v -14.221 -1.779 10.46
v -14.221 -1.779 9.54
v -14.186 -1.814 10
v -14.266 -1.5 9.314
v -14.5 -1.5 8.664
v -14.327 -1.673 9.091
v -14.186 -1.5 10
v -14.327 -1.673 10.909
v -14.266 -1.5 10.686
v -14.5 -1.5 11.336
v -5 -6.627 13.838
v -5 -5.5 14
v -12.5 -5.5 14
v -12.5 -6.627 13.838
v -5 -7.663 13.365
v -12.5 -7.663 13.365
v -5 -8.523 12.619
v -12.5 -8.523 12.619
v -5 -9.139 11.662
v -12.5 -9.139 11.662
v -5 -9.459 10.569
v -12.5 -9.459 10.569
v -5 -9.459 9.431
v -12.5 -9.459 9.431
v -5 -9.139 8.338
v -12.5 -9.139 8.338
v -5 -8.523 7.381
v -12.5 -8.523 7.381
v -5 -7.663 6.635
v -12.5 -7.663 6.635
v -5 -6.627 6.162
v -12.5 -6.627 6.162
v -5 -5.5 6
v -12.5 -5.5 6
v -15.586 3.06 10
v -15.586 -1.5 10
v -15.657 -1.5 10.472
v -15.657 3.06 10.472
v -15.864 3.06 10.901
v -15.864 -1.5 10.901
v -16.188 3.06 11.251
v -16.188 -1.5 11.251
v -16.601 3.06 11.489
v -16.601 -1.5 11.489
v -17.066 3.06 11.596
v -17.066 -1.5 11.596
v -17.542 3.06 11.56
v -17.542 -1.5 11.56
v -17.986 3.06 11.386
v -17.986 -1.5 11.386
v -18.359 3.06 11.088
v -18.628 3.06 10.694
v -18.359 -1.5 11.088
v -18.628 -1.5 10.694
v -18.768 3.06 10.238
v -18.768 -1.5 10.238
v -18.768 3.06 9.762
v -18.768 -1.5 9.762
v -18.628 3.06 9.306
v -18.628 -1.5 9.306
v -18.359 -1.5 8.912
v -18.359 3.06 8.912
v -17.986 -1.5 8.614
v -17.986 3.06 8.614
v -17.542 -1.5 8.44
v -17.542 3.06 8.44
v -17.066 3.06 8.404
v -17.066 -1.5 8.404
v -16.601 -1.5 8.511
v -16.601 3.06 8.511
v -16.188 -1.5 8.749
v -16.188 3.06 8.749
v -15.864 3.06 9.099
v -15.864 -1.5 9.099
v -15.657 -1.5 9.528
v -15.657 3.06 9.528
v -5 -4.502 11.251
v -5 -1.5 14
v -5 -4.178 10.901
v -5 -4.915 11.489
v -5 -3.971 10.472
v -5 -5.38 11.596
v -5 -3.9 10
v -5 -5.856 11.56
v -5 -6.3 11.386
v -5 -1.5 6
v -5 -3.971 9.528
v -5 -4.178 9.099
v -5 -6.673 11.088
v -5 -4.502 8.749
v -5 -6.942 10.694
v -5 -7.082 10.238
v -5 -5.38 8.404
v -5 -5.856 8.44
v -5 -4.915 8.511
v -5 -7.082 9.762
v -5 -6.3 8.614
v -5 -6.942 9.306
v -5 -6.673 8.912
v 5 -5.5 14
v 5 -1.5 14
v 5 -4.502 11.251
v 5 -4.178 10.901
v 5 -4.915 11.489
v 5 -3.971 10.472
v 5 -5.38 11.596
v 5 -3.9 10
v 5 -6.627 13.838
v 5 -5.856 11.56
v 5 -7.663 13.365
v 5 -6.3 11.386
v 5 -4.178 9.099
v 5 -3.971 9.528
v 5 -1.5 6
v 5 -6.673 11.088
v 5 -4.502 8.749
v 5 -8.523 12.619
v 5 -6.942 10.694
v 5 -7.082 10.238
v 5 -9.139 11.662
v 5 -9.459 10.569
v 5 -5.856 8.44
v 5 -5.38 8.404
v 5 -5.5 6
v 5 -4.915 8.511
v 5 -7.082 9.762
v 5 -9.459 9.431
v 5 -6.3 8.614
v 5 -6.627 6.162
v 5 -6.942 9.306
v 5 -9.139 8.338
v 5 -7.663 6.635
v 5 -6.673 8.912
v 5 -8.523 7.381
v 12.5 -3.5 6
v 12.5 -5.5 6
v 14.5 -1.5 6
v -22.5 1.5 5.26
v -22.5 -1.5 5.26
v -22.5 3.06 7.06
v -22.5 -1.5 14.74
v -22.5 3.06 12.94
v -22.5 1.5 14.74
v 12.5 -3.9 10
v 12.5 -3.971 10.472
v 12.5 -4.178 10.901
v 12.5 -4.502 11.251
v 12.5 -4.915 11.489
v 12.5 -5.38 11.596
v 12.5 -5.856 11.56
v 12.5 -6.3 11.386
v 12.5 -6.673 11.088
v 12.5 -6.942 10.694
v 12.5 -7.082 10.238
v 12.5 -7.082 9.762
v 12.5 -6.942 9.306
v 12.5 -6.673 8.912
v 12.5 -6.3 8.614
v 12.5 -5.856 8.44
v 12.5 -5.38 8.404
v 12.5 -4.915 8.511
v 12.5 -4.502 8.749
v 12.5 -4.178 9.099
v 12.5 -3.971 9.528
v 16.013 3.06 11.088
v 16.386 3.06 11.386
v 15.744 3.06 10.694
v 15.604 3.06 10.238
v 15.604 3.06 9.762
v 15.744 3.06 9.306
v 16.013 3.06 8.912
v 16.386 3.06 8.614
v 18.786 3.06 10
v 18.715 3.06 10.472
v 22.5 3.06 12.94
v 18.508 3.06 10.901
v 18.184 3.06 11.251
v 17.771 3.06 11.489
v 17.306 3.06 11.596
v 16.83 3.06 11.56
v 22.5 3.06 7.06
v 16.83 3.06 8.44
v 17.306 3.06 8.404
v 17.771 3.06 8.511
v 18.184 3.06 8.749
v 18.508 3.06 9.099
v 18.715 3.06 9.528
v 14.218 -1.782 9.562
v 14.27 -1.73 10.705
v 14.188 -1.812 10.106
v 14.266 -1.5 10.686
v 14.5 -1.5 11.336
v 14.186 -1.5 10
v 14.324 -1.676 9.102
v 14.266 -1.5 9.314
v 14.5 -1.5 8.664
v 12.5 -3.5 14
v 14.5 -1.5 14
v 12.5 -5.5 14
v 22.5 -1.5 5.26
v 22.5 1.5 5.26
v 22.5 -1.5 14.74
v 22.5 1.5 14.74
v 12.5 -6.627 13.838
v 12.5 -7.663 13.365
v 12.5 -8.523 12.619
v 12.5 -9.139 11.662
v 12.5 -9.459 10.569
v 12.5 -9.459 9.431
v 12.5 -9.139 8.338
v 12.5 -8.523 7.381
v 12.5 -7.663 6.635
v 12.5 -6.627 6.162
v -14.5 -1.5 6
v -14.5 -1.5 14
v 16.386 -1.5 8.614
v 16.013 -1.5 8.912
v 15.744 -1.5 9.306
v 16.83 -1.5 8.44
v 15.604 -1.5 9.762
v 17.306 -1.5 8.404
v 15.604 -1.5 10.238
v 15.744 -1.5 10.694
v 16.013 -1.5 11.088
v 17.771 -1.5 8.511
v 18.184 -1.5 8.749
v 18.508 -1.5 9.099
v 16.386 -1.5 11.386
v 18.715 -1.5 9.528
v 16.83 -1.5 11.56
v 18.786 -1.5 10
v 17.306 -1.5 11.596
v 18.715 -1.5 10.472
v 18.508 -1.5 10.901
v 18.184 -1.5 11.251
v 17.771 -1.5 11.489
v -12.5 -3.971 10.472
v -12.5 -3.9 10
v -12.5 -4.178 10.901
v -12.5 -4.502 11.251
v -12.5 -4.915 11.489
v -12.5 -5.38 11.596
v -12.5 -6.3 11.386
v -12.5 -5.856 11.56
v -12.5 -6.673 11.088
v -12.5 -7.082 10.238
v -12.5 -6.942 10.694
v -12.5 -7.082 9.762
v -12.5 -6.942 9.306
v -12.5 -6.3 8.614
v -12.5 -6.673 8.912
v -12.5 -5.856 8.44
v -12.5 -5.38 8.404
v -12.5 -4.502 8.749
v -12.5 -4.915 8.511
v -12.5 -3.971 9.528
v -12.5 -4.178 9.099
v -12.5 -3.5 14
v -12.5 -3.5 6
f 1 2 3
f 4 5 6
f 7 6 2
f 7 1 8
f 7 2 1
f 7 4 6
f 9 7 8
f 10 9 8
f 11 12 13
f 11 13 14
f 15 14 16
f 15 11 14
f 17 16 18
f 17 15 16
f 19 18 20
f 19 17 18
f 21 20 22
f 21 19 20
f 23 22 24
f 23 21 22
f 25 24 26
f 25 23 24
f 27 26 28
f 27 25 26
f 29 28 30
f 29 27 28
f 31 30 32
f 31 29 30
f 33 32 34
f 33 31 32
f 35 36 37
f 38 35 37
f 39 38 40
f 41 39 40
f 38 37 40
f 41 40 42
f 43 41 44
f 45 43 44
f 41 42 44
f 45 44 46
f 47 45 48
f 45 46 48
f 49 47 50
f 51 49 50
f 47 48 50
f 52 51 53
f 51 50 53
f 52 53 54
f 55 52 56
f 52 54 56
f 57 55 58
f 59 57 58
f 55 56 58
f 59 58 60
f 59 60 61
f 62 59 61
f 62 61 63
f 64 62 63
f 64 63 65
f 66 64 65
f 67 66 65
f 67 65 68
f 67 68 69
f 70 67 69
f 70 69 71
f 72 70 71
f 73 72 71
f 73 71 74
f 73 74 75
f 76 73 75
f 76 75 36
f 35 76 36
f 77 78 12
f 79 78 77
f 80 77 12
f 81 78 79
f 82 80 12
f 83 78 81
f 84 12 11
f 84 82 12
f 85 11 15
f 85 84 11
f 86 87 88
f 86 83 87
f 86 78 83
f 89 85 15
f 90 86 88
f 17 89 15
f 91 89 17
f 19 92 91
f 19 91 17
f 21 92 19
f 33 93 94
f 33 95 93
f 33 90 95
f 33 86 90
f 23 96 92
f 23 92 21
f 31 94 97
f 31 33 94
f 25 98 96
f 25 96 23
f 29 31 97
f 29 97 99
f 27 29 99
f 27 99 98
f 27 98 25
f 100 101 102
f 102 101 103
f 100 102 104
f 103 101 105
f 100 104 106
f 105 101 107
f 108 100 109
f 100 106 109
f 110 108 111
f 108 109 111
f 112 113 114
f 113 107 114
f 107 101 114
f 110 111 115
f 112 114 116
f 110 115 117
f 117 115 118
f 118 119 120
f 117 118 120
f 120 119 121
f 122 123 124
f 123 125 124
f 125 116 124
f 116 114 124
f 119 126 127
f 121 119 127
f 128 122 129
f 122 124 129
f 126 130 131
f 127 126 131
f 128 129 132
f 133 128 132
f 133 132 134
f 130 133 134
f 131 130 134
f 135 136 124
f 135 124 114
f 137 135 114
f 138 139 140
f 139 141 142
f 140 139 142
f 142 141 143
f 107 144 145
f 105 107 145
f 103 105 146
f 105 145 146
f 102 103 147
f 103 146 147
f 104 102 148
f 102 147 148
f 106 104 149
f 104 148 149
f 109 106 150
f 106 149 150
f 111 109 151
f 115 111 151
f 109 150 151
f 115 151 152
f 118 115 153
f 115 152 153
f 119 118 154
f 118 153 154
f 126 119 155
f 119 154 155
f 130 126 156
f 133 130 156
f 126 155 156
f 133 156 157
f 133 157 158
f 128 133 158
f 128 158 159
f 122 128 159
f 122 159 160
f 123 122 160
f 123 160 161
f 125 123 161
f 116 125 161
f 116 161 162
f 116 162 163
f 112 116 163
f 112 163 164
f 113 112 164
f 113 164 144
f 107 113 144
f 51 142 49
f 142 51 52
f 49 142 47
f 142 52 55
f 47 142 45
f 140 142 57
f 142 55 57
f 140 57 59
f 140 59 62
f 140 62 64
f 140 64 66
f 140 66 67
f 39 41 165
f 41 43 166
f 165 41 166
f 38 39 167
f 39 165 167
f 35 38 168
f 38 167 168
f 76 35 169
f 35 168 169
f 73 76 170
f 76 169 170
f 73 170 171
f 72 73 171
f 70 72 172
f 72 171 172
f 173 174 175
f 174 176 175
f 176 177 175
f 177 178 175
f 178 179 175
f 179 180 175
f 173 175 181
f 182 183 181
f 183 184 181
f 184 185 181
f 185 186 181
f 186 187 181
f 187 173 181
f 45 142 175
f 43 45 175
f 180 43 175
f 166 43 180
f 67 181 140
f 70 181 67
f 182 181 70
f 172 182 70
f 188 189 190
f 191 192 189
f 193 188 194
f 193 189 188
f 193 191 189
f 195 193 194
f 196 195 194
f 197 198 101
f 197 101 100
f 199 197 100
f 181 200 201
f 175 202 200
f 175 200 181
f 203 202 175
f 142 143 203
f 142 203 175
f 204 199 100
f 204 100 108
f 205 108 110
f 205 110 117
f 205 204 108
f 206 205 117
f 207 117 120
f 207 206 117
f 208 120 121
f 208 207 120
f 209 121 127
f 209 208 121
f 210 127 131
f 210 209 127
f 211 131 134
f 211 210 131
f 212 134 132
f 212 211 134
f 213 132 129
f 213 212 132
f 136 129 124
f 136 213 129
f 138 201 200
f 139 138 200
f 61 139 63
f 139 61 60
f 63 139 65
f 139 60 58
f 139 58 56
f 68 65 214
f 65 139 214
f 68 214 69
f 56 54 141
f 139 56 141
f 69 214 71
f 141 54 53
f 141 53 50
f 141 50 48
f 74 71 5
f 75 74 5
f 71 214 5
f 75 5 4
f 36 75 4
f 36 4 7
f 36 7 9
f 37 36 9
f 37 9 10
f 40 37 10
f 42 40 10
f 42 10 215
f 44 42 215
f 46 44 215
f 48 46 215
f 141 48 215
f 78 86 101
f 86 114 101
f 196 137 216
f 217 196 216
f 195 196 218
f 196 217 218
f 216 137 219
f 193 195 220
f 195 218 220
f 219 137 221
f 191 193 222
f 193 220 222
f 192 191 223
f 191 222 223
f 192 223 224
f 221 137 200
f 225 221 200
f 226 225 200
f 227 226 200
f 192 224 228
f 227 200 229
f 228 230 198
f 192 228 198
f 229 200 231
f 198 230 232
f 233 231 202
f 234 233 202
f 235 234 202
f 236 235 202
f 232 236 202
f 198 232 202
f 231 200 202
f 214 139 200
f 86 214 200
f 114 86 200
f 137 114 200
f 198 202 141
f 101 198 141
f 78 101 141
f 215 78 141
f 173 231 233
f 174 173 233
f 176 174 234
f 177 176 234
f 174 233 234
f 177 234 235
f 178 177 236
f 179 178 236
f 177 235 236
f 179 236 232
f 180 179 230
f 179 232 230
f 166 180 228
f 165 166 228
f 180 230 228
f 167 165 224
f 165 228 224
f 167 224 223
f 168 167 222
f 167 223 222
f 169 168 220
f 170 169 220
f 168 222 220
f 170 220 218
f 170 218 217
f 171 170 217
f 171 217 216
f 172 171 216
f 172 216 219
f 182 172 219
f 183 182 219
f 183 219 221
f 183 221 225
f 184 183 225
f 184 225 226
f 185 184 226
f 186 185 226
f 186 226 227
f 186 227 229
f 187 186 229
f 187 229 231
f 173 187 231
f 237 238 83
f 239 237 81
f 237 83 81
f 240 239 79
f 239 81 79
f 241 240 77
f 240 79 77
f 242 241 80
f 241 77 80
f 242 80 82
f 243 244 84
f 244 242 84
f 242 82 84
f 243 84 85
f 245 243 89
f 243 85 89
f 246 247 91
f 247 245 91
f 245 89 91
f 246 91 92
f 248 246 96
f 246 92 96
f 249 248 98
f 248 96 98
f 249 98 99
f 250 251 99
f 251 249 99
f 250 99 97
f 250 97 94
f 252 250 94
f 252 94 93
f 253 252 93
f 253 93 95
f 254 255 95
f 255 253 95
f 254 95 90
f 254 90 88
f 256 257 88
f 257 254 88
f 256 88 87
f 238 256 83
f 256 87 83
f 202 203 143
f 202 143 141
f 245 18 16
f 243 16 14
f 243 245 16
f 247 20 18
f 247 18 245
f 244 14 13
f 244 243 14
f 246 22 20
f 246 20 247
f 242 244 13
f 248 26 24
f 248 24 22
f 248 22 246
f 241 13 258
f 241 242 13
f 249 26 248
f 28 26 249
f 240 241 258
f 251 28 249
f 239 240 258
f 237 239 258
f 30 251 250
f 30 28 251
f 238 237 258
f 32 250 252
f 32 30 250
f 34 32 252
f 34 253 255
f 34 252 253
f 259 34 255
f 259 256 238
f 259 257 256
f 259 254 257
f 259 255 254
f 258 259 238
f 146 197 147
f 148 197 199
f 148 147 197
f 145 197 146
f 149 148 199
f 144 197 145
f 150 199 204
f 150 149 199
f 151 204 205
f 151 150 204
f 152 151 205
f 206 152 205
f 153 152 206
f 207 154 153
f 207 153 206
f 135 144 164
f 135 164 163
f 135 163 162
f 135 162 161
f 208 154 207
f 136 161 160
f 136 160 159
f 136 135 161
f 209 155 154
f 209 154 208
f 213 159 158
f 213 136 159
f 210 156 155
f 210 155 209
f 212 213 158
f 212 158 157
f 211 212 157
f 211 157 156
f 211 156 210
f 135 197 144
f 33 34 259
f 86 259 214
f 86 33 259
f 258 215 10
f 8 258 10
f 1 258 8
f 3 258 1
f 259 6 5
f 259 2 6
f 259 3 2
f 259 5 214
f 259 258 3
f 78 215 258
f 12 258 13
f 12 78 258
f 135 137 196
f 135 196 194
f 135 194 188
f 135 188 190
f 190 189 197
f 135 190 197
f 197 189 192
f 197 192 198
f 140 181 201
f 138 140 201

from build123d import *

# Parameters (mm, degrees)
SKETCH_W           = 45
SKETCH_H           = 3
PAD_DEPTH          = 20
PAD001_DEPTH       = 45
SKETCH002_R        = 1.6
POCKET_DEPTH       = 4.561
SKETCH004_R        = 1.6
PAD002_DEPTH       = 45
PAD002_FACE9_R     = 1.6
POCKET001_DEPTH    = 10
POCKET001_FACE14_R = 1.6
POCKET002_DEPTH    = 10
SKETCH005_W        = 10
SKETCH005_H        = 8
POCKET003_DEPTH    = 20.001
SKETCH006_W        = 3
SKETCH006_H        = 5.26
POCKET004_DEPTH    = 45.001
CHAMFER_SIZE       = 2
SKETCH007_R        = 3
POCKET005_DEPTH    = 8.001


with BuildPart() as part:
    # Sketch → Pad (new body)
    with BuildSketch(Plane.XY):
        Rectangle(SKETCH_W, SKETCH_H)
    extrude(amount=PAD_DEPTH)

    # Sketch001 (on Face2 of Pad) → Pad001 (join)
    with BuildSketch(Plane.YZ.offset(22.5)):
        Polygon((1.5, 10), (1.5, 14.74), (3.06, 12.94), (3.06, 7.06), (1.5, 5.26), align=None)
    extrude(amount=-PAD001_DEPTH)

    # Sketch002 (on Face6 of Pad001) → Pocket (cut, through all)
    with BuildSketch(Plane.XZ.offset(1.5)):
        with Locations((-17.186, 10)):
            Circle(SKETCH002_R)
        with Locations((17.186, 10)):
            Circle(SKETCH002_R)
    extrude(amount=-POCKET_DEPTH, mode=Mode.SUBTRACT)

    # Sketch004 (on Face3 of Pocket) → Pad002 (join)
    with BuildSketch(Plane.YZ.offset(22.5)):
        with BuildLine():
            ThreePointArc((-5.5, 14), (-9.5, 10), (-5.5, 6))
            Line((-5.5, 6), (-1.5, 6))
            Line((-1.5, 14), (-1.5, 6))
            Line((-1.5, 14), (-5.5, 14))
        make_face()
        with Locations((-5.5, 10)):
            Circle(SKETCH004_R, mode=Mode.SUBTRACT)
    extrude(amount=-PAD002_DEPTH)

    # Pad002 Face9 → Pocket001 (cut)
    with BuildSketch(Plane(origin=(22.5, -5.065426, 10), x_dir=(0, -1, 0), z_dir=(1, 0, 0))):
        with BuildLine():
            ThreePointArc((0.434574, -4), (4.434574, 0), (0.434574, 4))
            Line((0.434574, 4), (-3.565426, 4))
            Line((-3.565426, 4), (-3.565426, -4))
            Line((-3.565426, -4), (0.434574, -4))
        make_face()
        with Locations((0.434574, 0)):
            Circle(PAD002_FACE9_R, mode=Mode.SUBTRACT)
    extrude(amount=-POCKET001_DEPTH, mode=Mode.SUBTRACT)

    # Pocket001 Face14 → Pocket002 (cut)
    with BuildSketch(Plane(origin=(-22.5, -5.065426, 10), x_dir=(0, 1, 0), z_dir=(-1, 0, 0))):
        with BuildLine():
            ThreePointArc((-0.434574, 4), (-4.434574, 0), (-0.434574, -4))
            Line((-0.434574, -4), (3.565426, -4))
            Line((3.565426, -4), (3.565426, 4))
            Line((3.565426, 4), (-0.434574, 4))
        make_face()
        with Locations((-0.434574, 0)):
            Circle(POCKET001_FACE14_R, mode=Mode.SUBTRACT)
    extrude(amount=-POCKET002_DEPTH, mode=Mode.SUBTRACT)

    # Sketch005 (on Face2 of Pocket002) → Pocket003 (cut, through all)
    with BuildSketch(Plane(origin=(0, 0, 0), x_dir=(1, 0, 0), z_dir=(0, 0, -1))):
        with Locations((0, 5.5)):
            Rectangle(SKETCH005_W, SKETCH005_H)
    extrude(amount=-POCKET003_DEPTH, mode=Mode.SUBTRACT)

    # Sketch006 (on Face5 of Pocket003) → Pocket004 (cut, through all)
    with BuildSketch(Plane(origin=(-22.5, 0, 0), x_dir=(0, -1, 0), z_dir=(-1, 0, 0))):
        with Locations((0, 17.37)):
            Rectangle(SKETCH006_W, SKETCH006_H)
        with Locations((0, 2.63)):
            Rectangle(SKETCH006_W, SKETCH006_H)
    extrude(amount=-POCKET004_DEPTH, mode=Mode.SUBTRACT)

    # Chamfer
    chamfer_edges = [part.edges().sort_by_distance(p)[0] for p in [
        (-12.5, -1.5, 10),
        (12.5, -1.5, 10),
    ]]
    chamfer(chamfer_edges, length=CHAMFER_SIZE)

    # Sketch007 (on Face29 of Chamfer) → Pocket005 (cut, through all)
    with BuildSketch(Plane.XZ.offset(1.5)):
        with Locations((-17.186, 10)):
            Circle(SKETCH007_R)
        with Locations((17.186, 10)):
            Circle(SKETCH007_R)
    extrude(amount=POCKET005_DEPTH, mode=Mode.SUBTRACT)


solid = part.part
